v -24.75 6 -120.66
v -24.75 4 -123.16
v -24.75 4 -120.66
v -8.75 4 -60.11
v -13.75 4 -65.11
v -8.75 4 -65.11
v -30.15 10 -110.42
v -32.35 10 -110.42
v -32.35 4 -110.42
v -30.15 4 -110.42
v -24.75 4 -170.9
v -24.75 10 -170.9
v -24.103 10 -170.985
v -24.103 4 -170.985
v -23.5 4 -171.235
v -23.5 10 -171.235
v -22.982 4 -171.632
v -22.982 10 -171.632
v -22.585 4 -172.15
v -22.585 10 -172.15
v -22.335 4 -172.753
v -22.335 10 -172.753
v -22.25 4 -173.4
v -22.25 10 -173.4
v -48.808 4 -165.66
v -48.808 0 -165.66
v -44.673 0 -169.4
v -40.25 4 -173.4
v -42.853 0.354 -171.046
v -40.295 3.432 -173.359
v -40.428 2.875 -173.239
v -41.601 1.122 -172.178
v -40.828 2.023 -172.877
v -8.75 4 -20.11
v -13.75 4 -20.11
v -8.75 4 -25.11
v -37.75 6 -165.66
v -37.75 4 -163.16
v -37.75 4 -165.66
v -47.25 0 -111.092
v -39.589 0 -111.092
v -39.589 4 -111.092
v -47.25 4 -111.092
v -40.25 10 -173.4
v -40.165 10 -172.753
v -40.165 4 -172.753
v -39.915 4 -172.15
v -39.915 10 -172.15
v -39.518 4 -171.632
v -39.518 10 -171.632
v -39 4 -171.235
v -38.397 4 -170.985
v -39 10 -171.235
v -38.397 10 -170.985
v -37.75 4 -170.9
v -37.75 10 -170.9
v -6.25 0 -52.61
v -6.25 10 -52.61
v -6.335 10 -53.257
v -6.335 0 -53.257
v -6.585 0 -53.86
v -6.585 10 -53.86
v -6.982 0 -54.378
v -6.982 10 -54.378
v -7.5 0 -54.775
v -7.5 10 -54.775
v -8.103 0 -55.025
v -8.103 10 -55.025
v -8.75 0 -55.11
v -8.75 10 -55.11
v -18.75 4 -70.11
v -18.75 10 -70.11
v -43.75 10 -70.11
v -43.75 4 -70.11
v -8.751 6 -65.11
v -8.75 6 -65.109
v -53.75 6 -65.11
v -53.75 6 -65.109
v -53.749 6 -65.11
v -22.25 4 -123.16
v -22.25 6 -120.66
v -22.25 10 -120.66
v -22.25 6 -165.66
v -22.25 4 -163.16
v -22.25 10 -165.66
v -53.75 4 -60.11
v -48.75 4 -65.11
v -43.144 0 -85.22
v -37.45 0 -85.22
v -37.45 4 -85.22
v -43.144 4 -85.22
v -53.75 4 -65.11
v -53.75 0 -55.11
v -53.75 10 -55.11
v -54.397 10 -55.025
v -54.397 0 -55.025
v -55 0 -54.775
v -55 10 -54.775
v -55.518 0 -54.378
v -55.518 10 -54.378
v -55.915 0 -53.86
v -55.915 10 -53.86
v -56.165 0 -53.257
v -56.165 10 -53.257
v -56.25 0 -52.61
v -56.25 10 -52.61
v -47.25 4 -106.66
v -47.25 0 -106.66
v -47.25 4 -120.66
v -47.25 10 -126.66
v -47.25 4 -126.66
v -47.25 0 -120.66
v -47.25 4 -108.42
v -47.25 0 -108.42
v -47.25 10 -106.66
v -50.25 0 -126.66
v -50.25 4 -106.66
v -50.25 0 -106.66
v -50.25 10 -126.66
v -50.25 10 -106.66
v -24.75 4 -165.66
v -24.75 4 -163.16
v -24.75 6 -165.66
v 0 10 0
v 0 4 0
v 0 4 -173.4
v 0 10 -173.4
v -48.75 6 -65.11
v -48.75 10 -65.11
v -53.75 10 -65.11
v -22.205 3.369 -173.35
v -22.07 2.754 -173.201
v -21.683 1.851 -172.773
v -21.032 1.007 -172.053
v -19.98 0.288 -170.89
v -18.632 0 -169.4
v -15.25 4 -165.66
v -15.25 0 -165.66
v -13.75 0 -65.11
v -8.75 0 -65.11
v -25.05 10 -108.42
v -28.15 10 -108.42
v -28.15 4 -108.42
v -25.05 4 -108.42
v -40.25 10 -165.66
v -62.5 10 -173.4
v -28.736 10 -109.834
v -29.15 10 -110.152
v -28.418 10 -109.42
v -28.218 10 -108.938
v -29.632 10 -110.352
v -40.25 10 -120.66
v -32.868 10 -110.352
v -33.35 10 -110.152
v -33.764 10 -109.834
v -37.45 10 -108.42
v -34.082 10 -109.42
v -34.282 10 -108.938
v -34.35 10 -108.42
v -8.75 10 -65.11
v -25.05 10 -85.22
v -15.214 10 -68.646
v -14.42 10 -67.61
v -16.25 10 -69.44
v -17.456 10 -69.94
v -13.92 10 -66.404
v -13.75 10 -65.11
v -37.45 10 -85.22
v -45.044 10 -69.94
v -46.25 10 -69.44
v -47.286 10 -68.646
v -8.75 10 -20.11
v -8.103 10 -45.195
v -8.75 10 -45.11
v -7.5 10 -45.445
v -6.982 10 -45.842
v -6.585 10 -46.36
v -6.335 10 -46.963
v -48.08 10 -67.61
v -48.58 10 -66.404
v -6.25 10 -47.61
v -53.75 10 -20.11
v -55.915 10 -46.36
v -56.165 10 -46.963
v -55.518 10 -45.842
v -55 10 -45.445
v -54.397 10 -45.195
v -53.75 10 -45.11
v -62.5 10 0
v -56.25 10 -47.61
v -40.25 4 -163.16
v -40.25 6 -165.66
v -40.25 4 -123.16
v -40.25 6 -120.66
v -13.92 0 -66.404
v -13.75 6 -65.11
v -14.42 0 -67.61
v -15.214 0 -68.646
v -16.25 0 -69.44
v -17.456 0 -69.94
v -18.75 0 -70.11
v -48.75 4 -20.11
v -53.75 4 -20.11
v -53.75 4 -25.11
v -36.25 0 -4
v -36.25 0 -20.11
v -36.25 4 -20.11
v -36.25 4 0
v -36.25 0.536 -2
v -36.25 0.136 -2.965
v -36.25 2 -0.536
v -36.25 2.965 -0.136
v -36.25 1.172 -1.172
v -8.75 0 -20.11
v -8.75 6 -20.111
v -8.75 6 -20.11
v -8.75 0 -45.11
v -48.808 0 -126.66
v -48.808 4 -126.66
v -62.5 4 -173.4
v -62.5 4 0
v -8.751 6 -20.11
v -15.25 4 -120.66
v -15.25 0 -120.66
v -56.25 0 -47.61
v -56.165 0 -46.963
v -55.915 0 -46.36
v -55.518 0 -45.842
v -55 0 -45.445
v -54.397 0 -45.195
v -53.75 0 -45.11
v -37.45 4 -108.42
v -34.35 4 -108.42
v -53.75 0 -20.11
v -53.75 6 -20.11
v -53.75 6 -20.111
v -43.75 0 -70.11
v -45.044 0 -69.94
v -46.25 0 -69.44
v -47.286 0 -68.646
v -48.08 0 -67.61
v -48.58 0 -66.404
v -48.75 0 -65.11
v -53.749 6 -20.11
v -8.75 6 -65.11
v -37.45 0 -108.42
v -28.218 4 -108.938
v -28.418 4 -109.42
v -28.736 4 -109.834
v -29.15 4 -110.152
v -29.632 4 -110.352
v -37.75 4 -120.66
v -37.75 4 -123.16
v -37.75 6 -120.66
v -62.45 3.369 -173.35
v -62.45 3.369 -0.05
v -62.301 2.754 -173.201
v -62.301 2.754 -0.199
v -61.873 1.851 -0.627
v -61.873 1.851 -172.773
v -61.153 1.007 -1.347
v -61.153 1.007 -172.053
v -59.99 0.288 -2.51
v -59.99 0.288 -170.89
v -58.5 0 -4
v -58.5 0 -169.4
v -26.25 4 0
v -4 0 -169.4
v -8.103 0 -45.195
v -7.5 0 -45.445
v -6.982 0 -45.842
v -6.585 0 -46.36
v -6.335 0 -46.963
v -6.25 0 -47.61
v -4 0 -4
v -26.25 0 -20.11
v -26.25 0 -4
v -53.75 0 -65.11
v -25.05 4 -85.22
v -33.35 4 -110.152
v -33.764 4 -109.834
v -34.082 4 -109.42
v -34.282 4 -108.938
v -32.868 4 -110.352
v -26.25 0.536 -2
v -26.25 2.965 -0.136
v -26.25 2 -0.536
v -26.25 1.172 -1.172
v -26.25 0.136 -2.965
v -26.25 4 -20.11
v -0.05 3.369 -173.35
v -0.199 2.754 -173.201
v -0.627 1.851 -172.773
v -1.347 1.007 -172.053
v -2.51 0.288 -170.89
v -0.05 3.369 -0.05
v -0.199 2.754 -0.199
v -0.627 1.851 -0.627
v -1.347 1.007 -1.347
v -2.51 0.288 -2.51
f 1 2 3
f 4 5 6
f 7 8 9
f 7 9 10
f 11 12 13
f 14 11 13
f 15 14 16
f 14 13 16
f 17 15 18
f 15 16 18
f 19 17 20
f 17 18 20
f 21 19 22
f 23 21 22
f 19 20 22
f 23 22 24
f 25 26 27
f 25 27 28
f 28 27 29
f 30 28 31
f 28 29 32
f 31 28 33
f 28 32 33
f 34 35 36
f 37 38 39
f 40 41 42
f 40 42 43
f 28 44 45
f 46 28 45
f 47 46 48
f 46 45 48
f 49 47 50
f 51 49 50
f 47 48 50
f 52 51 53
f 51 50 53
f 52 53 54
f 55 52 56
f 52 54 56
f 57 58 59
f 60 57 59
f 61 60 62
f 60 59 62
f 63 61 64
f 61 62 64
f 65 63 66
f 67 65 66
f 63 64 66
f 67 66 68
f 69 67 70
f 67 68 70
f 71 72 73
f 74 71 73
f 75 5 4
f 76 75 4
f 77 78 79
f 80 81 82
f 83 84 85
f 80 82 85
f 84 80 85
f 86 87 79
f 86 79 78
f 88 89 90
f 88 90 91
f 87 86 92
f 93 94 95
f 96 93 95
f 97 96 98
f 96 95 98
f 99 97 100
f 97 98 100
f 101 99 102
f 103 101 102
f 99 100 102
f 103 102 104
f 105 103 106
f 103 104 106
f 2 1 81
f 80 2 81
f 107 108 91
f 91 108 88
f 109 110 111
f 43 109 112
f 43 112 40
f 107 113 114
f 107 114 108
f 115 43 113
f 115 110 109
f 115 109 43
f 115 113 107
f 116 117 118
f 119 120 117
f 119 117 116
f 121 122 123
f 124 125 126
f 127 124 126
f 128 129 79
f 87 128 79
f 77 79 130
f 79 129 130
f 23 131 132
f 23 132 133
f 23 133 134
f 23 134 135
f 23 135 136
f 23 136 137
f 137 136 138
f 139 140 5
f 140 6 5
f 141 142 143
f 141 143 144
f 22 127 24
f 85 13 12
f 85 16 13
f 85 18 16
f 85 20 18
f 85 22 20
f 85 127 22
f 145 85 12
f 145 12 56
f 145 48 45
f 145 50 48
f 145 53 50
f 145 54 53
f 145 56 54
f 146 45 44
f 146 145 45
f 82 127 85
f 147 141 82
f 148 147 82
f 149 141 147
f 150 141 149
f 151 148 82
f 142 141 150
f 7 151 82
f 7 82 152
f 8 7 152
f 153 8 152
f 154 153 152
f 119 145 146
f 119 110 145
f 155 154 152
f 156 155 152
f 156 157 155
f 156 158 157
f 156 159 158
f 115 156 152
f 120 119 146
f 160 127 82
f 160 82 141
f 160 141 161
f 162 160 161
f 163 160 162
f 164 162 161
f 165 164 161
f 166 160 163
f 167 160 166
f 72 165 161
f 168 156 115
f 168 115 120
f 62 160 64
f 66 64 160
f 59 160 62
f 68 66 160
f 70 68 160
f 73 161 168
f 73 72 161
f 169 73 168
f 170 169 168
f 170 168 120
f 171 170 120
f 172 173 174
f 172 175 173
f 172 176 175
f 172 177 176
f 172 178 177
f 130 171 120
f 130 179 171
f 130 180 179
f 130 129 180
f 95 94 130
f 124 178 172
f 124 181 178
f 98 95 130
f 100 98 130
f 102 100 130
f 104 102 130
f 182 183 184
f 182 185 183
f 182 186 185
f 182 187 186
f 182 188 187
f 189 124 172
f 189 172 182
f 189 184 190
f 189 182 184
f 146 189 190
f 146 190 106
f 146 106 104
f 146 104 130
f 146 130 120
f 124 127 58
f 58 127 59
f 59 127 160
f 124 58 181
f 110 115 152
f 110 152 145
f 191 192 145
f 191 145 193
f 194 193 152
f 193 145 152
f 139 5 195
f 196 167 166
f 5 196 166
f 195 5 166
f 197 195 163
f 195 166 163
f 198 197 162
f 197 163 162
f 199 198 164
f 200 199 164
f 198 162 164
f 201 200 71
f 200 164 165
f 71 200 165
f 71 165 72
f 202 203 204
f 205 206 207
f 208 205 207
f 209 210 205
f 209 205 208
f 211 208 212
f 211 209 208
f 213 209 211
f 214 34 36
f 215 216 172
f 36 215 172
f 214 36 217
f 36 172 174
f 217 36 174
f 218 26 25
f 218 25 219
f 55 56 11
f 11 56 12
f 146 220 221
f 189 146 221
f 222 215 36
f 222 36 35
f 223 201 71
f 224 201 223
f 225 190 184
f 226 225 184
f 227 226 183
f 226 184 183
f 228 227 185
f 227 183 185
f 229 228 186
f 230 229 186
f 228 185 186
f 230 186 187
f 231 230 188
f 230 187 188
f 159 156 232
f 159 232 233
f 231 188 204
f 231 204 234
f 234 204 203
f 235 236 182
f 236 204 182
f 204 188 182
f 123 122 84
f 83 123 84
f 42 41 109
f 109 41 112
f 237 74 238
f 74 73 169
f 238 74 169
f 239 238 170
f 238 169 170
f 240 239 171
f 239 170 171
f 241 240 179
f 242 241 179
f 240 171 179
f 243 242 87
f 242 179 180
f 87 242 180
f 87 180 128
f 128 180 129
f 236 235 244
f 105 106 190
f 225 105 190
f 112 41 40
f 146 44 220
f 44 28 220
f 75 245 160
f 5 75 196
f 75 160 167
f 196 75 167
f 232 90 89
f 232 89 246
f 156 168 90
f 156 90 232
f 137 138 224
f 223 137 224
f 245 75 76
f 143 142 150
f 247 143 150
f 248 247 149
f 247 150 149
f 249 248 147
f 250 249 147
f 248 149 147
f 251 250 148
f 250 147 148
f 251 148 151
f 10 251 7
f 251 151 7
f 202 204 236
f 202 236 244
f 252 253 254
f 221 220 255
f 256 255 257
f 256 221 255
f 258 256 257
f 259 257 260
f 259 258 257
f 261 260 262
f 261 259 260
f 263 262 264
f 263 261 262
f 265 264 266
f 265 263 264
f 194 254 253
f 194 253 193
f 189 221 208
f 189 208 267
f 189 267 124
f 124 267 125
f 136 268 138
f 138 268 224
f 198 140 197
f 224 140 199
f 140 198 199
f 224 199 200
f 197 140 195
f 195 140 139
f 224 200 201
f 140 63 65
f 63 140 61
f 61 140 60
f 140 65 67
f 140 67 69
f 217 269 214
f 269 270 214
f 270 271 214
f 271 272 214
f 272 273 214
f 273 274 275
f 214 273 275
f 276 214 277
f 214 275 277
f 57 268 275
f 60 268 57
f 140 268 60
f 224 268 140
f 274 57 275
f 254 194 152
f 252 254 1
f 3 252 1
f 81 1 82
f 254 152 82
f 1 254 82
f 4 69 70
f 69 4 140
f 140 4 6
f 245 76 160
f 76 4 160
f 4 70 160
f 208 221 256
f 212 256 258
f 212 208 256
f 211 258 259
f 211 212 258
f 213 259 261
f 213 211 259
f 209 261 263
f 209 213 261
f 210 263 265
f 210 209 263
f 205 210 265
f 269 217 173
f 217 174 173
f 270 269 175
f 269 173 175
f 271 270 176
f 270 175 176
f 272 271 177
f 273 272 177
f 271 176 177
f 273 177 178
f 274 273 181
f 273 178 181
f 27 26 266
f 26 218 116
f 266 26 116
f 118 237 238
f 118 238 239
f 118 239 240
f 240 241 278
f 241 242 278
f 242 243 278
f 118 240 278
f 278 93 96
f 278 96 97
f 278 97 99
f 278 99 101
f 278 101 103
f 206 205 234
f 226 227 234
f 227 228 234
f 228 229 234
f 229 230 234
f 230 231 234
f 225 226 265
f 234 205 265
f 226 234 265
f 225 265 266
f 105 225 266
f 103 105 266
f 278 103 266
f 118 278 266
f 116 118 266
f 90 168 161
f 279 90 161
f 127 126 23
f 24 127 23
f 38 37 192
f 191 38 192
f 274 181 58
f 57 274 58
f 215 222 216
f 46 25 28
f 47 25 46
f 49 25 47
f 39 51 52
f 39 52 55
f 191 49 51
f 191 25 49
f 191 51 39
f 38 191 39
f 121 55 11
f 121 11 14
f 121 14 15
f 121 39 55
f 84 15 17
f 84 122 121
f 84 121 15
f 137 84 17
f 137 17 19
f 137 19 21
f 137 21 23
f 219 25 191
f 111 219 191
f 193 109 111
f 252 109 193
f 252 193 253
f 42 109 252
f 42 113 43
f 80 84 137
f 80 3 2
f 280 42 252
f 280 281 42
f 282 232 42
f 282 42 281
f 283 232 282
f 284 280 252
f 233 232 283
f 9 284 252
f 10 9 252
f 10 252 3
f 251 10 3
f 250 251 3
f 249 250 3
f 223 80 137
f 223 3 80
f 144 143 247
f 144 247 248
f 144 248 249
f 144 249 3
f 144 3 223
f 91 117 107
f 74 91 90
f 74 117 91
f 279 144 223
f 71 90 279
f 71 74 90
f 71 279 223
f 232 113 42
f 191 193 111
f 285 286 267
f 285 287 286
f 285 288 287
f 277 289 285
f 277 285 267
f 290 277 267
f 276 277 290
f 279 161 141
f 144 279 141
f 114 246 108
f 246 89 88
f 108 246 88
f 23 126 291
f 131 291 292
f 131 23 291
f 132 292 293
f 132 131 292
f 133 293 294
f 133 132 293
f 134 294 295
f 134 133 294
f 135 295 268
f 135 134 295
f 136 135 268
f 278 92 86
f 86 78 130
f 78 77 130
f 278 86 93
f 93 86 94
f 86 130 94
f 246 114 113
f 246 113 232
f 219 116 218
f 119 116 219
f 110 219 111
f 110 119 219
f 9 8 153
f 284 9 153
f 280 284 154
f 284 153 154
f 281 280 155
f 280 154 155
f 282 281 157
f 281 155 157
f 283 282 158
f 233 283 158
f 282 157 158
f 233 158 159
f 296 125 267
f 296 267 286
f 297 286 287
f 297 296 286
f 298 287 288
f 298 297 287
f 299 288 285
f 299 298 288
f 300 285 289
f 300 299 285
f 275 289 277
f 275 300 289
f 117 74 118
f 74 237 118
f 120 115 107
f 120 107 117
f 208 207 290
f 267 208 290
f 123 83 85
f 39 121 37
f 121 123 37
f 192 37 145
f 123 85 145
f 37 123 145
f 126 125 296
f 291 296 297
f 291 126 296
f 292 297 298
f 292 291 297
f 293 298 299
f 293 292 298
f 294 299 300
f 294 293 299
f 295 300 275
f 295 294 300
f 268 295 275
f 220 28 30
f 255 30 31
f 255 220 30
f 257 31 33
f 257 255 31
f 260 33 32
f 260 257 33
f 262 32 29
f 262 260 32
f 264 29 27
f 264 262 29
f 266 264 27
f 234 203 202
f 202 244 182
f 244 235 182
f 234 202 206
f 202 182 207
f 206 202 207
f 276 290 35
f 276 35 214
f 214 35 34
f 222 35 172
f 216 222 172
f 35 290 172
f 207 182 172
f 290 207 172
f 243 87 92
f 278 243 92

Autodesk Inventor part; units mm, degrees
ref_plane "YZ Plane" through (0, 0, 0) normal (1, 0, 0) x (0, 1, 0)
ref_plane "XZ Plane" through (0, 0, 0) normal (0, 1, 0) x (-1, 0, 0)
sketch "Sketch1" plane through (0, 0, 0) normal (0, 1, 0) x (-1, 0, 0)
  line L0 (0, 0) -> (0, -173.4)
  line L1 (0, -173.4) -> (62.5, -173.4)
  line L2 (62.5, -173.4) -> (62.5, 0)
  line L3 (62.5, 0) -> (0, 0)
  dimension "d0" = 173.4
  dimension "d1" = 62.5
extrude "Extrusion1" add sketch "Sketch1" along normal blind 10
sketch "Sketch2" plane through (0, 10, 0) normal (0, 1, 0) x (1, 0, 0)
  line L0 (0, 0) -> (0, 102.12)
  line L1 (0, 0) -> (0, 173.4) projected
  line L2 (0, 102.12) -> (-62.5, 102.12)
  line L3 (-62.5, 173.4) -> (-62.5, 0) projected
  line L4 (-31.25, 102.12) -> (-31.25, 0)
  line L5 (-62.5, 0) -> (0, 0) projected
  line L6 (-31.25, 102.12) -> (-37.45, 102.12)
  line L7 (-37.45, 102.12) -> (-31.25, 102.12)
  line L8 (-31.25, 102.12) -> (-25.05, 102.12)
  line L9 (-25.05, 102.12) -> (-31.25, 102.12)
  line L10 (-31.25, 102.12) -> (-31.25, 85.22)
  line L11 (-31.25, 85.22) -> (-25.05, 85.22)
  line L12 (-25.05, 85.22) -> (-25.05, 102.12)
  line L13 (-31.25, 85.22) -> (-37.45, 85.22)
  line L14 (-37.45, 85.22) -> (-37.45, 102.12)
  line L15 (-31.25, 102.12) -> (-31.25, 108.42)
  line L16 (-31.25, 108.42) -> (-25.05, 108.42)
  line L17 (-25.05, 108.42) -> (-25.05, 102.12)
  line L18 (-37.45, 102.12) -> (-37.45, 108.42)
  line L19 (-37.45, 108.42) -> (-31.25, 108.42)
  line L20 (-31.25, 108.42) -> (-31.25, 173.4)
  line L21 (0, 173.4) -> (-62.5, 173.4) projected
  line L22 (-31.25, 140.91) -> (-31.25, 120.66)
  line L23 (-31.25, 120.66) -> (-22.25, 120.66)
  line L24 (-22.25, 120.66) -> (-22.25, 165.66)
  line L25 (-22.25, 165.66) -> (-40.25, 165.66)
  line L26 (-40.25, 165.66) -> (-40.25, 120.66)
  line L27 (-40.25, 120.66) -> (-31.25, 120.66)
  line L28 (-40.25, 120.66) -> (-40.25, 126.66)
  line L29 (-40.25, 126.66) -> (-44.25, 126.66)
  line L30 (-44.25, 126.66) -> (-47.25, 126.66)
  line L31 (-47.25, 126.66) -> (-47.25, 106.66)
  line L32 (-47.25, 106.66) -> (-50.25, 106.66)
  line L33 (-50.25, 106.66) -> (-50.25, 126.66)
  line L34 (-50.25, 126.66) -> (-47.25, 126.66)
  line L35 (-31.25, 0) -> (-31.25, 85.22)
  line L36 (-31.25, 42.61) -> (-31.25, 20.11)
  line L37 (-31.25, 20.11) -> (-31.25, 42.61)
  line L38 (-31.25, 42.61) -> (-31.25, 65.11)
  line L39 (-31.25, 65.11) -> (-53.75, 65.11)
  line L40 (-53.75, 65.11) -> (-53.75, 20.11)
  line L41 (-53.75, 20.11) -> (-8.75, 20.11)
  line L42 (-8.75, 20.11) -> (-8.75, 65.11)
  line L43 (-8.75, 65.11) -> (-31.25, 65.11)
  line L44 (-22.25, 120.66) -> (-40.25, 120.66)
  line L45 (-40.25, 120.66) -> (-40.25, 165.66)
  line L46 (-40.25, 165.66) -> (-22.25, 165.66)
  line L47 (-22.25, 165.66) -> (-22.25, 120.66)
  line L48 (-53.75, 65.11) -> (-48.75, 65.11)
  line L49 (-48.75, 65.11) -> (-8.75, 65.11)
  line L50 (-8.75, 65.11) -> (-13.75, 65.11)
  line L51 (-13.75, 65.11) -> (-13.75, 70.11)
  line L52 (-13.75, 70.11) -> (-48.75, 70.11)
  line L53 (-48.75, 70.11) -> (-48.75, 65.11)
  line L54 (-48.75, 65.11) -> (-13.75, 65.11) construction
  line L55 (-18.75, 70.11) -> (-43.75, 70.11)
  arc A0 (-43.75, 70.11) -> (-48.75, 65.11) centre (-43.75, 65.11) ccw
  arc A1 (-13.75, 65.11) -> (-18.75, 70.11) centre (-18.75, 65.11) ccw
  line L56 (-8.75, 65.11) -> (-8.75, 55.11)
  line L57 (-8.75, 55.11) -> (-8.75, 45.11)
  line L58 (-8.75, 45.11) -> (-53.75, 45.11)
  line L59 (-53.75, 45.11) -> (-53.75, 55.11)
  line L60 (-53.75, 45.11) -> (-53.75, 55.11) construction
  line L61 (-51.25, 47.61) -> (-51.25, 52.61)
  line L62 (-56.25, 52.61) -> (-56.25, 47.61)
  arc A2 (-56.25, 47.61) -> (-51.25, 47.61) centre (-53.75, 47.61) ccw
  arc A3 (-51.25, 52.61) -> (-56.25, 52.61) centre (-53.75, 52.61) ccw
  line L63 (-8.75, 45.11) -> (-8.75, 55.11) construction
  line L64 (-6.25, 47.61) -> (-6.25, 52.61)
  line L65 (-11.25, 52.61) -> (-11.25, 47.61)
  arc A4 (-11.25, 47.61) -> (-6.25, 47.61) centre (-8.75, 47.61) ccw
  arc A5 (-6.25, 52.61) -> (-11.25, 52.61) centre (-8.75, 52.61) ccw
  line L66 (-40.25, 165.66) -> (-40.25, 173.4)
  line L67 (-22.25, 165.66) -> (-22.25, 173.4)
  line L68 (-40.25, 173.4) -> (-22.25, 173.4) construction
  line L69 (-37.75, 170.9) -> (-24.75, 170.9)
  line L70 (-24.75, 175.9) -> (-37.75, 175.9)
  arc A6 (-37.75, 175.9) -> (-37.75, 170.9) centre (-37.75, 173.4) ccw
  arc A7 (-24.75, 170.9) -> (-24.75, 175.9) centre (-24.75, 173.4) ccw
  line L71 (-31.25, 102.12) -> (-34.35, 102.12)
  line L72 (-28.15, 102.12) -> (-31.25, 102.12)
  line L73 (-34.35, 102.12) -> (-28.15, 102.12) construction
  line L74 (-32.35, 100.12) -> (-30.15, 100.12)
  line L75 (-30.15, 104.12) -> (-32.35, 104.12)
  arc A8 (-32.35, 104.12) -> (-32.35, 100.12) centre (-32.35, 102.12) ccw
  arc A9 (-30.15, 100.12) -> (-30.15, 104.12) centre (-30.15, 102.12) ccw
  arc A10 (-32.35, 110.42) -> (-32.35, 106.42) centre (-32.35, 108.42) ccw
  arc A11 (-30.15, 106.42) -> (-30.15, 110.42) centre (-30.15, 108.42) ccw
  line L76 (-32.35, 110.42) -> (-30.15, 110.42)
  point P0 (-31.25, 165.66)
  point P1 (-31.25, 165.66)
  point P2 (-53.75, 50.11)
  point P3 (-8.75, 50.11)
  point P4 (-34.35, 108.42)
  point P5 (-28.15, 108.42)
  dimension "d4" = 102.12
  dimension "d5" = 6.2
  dimension "d6" = 6.2
  dimension "d7" = 16.9
  dimension "d8" = 6.3
  dimension "d11" = 20.25
  dimension "d12" = 9
  dimension "d13" = 45
  dimension "d14" = 18
  dimension "d15" = 6
  dimension "d16" = 4
  dimension "d17" = 3
  dimension "d18" = 20
  dimension "d19" = 3
  dimension "d20" = 22.5
  dimension "d21" = 22.5
  dimension "d22" = 22.5
  dimension "d23" = 45
  dimension "d24" = 5
  dimension "d25" = 5
  dimension "d26" = 5
  dimension "d27" = 10
  dimension "d28" = 10
  dimension "d29" = 5
  dimension "d30" = 5
  dimension "d36" = 5
  dimension "d37" = 4
  dimension "d39" = 4
extrude "Extrusion2" cut sketch "Sketch2" against normal through all contours L12 L11 L4 L74 A9 L2 | L2 A9 L75 L15 L16 L17 | L41 L40 L58 L4 | L4 L58 L42 L41 | A7 L69 L20 L21 | A9 L74 L4 L2 | L2 L15 L75 A9 | L31 L32 L33 L34 | L20 L69 A6 L21 | L24 L23 L20 L25 | L4 L74 A8 L2 | L2 A8 L75 L15 | L13 L14 L2 A8 L74 L4 | L16 L20 L76 A11 | L58 A2 L61 A3 L40 L39 L4 | L4 L43 L42 A5 L65 A4 L58 | A2 L62 A3 L40 | L40 A3 L61 A2 | A4 L65 A5 L42 | L42 A5 L64 A4 | L18 L19 L15 L75 A8 L2 | L20 L27 L26 L25 | L52 A1 L43 L4 | L4 L39 A0 L52 | L19 A10 L76 L20
sketch "Sketch3" plane through (0, 10, 0) normal (0, 1, 0) x (1, 0, 0)
  point P0 (0, 0)
sketch "Sketch4" plane through (0, 0, 0) normal (0, -1, 0) x (1, 0, 0)
  line L0 (-8.75, -20.11) -> (-53.75, -20.11) projected
  line L1 (-53.75, -20.11) -> (-8.75, -20.11)
  line L2 (-8.75, -20.11) -> (-31.25, -20.11)
  line L3 (-62.5, 0) -> (0, 0) projected
  line L4 (-31.25, 0) -> (-31.25, -20.11)
  line L5 (-31.25, -20.11) -> (-26.25, -20.11)
  line L6 (-26.25, -20.11) -> (-36.25, -20.11)
  line L7 (-36.25, -20.11) -> (-36.25, 0)
  line L8 (-36.25, 0) -> (-26.25, 0)
  line L9 (-26.25, 0) -> (-26.25, -20.11)
  line L10 (-40.25, -165.66) -> (-40.25, -120.66) projected
  line L11 (-40.25, -120.66) -> (-47.25, -120.66)
  line L12 (-47.25, -126.66) -> (-47.25, -106.66) projected
  line L13 (-48.8082, -126.9328) -> (-40.25, -126.9328)
  line L14 (-40.25, -126.9328) -> (-48.8082, -126.9328)
  line L15 (-40.25, -165.66) -> (-22.25, -165.66) projected
  line L16 (-40.25, -165.66) -> (-48.8082, -165.66)
  line L17 (-48.8082, -165.66) -> (-48.8082, -126.9328)
  line L18 (-22.25, -120.66) -> (-22.25, -165.66) projected
  line L19 (-22.25, -165.66) -> (-15.25, -165.66)
  line L20 (-15.25, -165.66) -> (-15.25, -120.66)
  line L21 (-15.25, -120.66) -> (-22.25, -120.66)
  line L22 (-40.25, -120.66) -> (-22.25, -120.66) projected
  line L23 (-22.25, -120.66) -> (-40.25, -120.66)
  line L24 (-40.25, -120.66) -> (-40.25, -126.9328)
  line L25 (-40.25, -165.66) -> (-40.25, -126.9328)
  line L26 (-22.25, -120.66) -> (-22.25, -165.66)
  line L27 (-40.25, -165.66) -> (-40.25, -173.4)
  line L28 (0, -173.4) -> (-62.5, -173.4) projected
  line L29 (-48.8082, -165.66) -> (-40.25, -173.4)
  line L30 (-22.25, -165.66) -> (-22.25, -173.4)
  line L31 (-22.25, -173.4) -> (-15.25, -165.66)
  line L32 (-40.25, -173.4) -> (-22.25, -173.4)
  line L33 (-37.45, -108.42) -> (-37.45, -85.22) projected
  line L34 (-25.05, -85.22) -> (-25.05, -108.42) projected
  line L35 (-37.45, -108.42) -> (-25.05, -108.42)
  line L36 (-25.05, -108.42) -> (-22.25, -120.66)
  line L37 (-37.45, -108.42) -> (-40.25, -120.66)
  line L38 (-43.75, -70.11) -> (-18.75, -70.11) projected
  line L39 (-50.25, -126.66) -> (-50.25, -106.66) projected
  line L40 (-43.75, -70.11) -> (-50.25, -106.66)
  line L41 (-47.25, -106.66) -> (-50.25, -106.66) projected
  line L42 (-47.25, -106.66) -> (-40.25, -70.11)
  line L43 (-18.75, -70.11) -> (-15.25, -120.66)
  line L44 (-25.05, -108.42) -> (-37.45, -108.42) projected
  line L45 (-25.05, -85.22) -> (-37.45, -85.22) projected
  line L46 (-25.05, -108.42) -> (-25.05, -85.22)
  line L47 (-25.05, -85.22) -> (-43.1438, -85.22)
  line L48 (-37.45, -108.42) -> (-47.25, -120.66)
  line L49 (-48.8082, -126.9328) -> (-48.8082, -120.66)
  line L50 (-48.8082, -120.66) -> (-47.25, -120.66)
  line L51 (-37.45, -108.42) -> (-47.25, -108.42)
  line L52 (-37.45, -108.42) -> (-38.0612, -111.0919)
  line L53 (-38.0612, -111.0919) -> (-47.25, -111.0919)
  point P0 (-39.5893, -111.0919)
  dimension "d31" = 5
  dimension "d32" = 10
  dimension "d33" = 7
extrude "Extrusion3" cut sketch "Sketch4" against normal blind 4 contours L0 L4 L3 L9 | L0 L7 L3 L4 | L16 L17 L13 L10 | L27 L29 L16 | L15 L30 L28 L27 | L13 L49 L50 L11 L10 | L18 L21 L20 L19 | L19 L31 L30 | L37 L35 L36 L22 | L11 L48 L53 L37 | L36 L34 L45 L47 L42 L38 L43 L21 | L53 L48 L37 | L12 L51 L48 L53 | L42 L41 L40 L38
sketch "Sketch5" plane through (-40.25, 10, -165.66) normal (0, 0, 1) x (1, 0, 0)
  point P0 (40.25, -10)
fillet "Fillet1" radius 4 6 edges at (0, 0, -86.7) (-62.5, 0, -86.7) (-49.375, 0, 0) (-13.125, 0, 0) (-51.375, 0, -173.4) (-11.125, 0, -173.4)
ref_plane "Work Plane1" through (-38.25, 4, -70.11) normal (0, -1, 0) x (1, 0, 0)
sketch "Sketch6" plane through (-38.25, 4, -70.11) normal (0, -1, 0) x (1, 0, 0)
  line L0 (-15.5, 15) -> (-15.5, 5) projected
  arc A0 (-10.5, 5) -> (-5.5, 0) centre (-5.5, 5) ccw projected
  line L1 (-15.5, 5) -> (-10.5, 5)
  line L2 (-15.5, 5) -> (-10.5, 5) projected
  line L3 (-10.5, 5) -> (-15.5, 5)
  line L4 (-15.5, 5) -> (-15.5, 10)
  line L5 (-15.5, 10) -> (-10.5, 5)
  line L6 (-15.5, 50) -> (-15.5, 25) projected
  line L7 (-15.5, 50) -> (-15.5, 45)
  line L8 (-15.5, 45) -> (-15.5, 50)
  line L9 (-15.5, 50) -> (2, 50) projected
  line L10 (-15.5, 50) -> (-10.5, 50)
  line L11 (-10.5, 50) -> (-15.5, 45)
  line L12 (-5.5, 0) -> (19.5, 0) projected
  line L13 (7, 0) -> (7, 50)
  line L14 (12, 50) -> (2, 50) projected
  line L15 (29.5, 15) -> (29.5, 5)
  line L16 (29.5, 5) -> (24.5, 5)
  line L17 (29.5, 10) -> (24.5, 5)
  line L18 (29.5, 50) -> (29.5, 45)
  line L19 (29.5, 50) -> (12, 50)
  line L20 (24.5, 50) -> (29.5, 45)
  line L21 (-2, -50.55) -> (-2, -95.55) projected
  line L22 (-2, -50.55) -> (-2, -53.05)
  line L23 (-2, -53.05) -> (-2, -50.55)
  line L24 (-2, -50.55) -> (-2, -53.05)
  line L25 (-2, -53.05) -> (0.5, -53.05)
  line L26 (0.5, -53.05) -> (0.5, -50.55)
  line L27 (16, -50.55) -> (-2, -50.55) projected
  line L28 (-2, -50.55) -> (0.5, -50.55)
  line L29 (-2, -50.55) -> (-2, -53.05)
  line L30 (7, -50.55) -> (7, -95.55)
  line L31 (-2, -95.55) -> (16, -95.55) projected
  line L32 (-2, -95.55) -> (-2, -93.05)
  line L33 (-2, -93.05) -> (0.5, -93.05)
  line L34 (0.5, -93.05) -> (0.5, -95.55)
  line L35 (0.5, -95.55) -> (-2, -95.55)
  line L36 (16, -50.55) -> (16, -95.55)
  line L37 (16, -50.55) -> (16, -53.05)
  line L38 (16, -53.05) -> (13.5, -53.05)
  line L39 (13.5, -53.05) -> (13.5, -50.55)
  line L40 (-2, -50.55) -> (16, -50.55)
  line L41 (16, -95.55) -> (-2, -95.55)
  line L42 (16, -93.05) -> (13.5, -93.05)
  line L43 (13.5, -93.05) -> (13.5, -95.55)
  point P0 (38.25, 70.11)
  dimension "d40" = 5
  dimension "d41" = 5
  dimension "d42" = 5
  dimension "d43" = 2.5
  dimension "d44" = 2.5
  dimension "d45" = 2.5
  dimension "d46" = 2.5
extrude "Extrusion4" add sketch "Sketch6" against normal blind 2 contours L5 L1 L0 | L11 L6 L9 | L19 L18 L20 | L15 L16 L17 | L27 L26 L25 L21 | L33 L34 L31 L21 | L27 L36 L38 L39 | L43 L42 L36 L31
chamfer "Chamfer1" distance 3.535 distance2 2 1 edges at (-51.25, 6, -22.61) measured on face at (-52.0833, 6, -21.7767)
chamfer "Chamfer2" distance 3.535 distance2 2 1 edges at (-51.25, 6, -62.61) measured on face at (-52.0833, 6, -63.4433)
chamfer "Chamfer3" distance 3.535 distance2 2 1 edges at (-11.25, 6, -62.61) measured on face at (-10.4167, 6, -63.4433)
chamfer "Chamfer4" distance 3.535 distance2 2 1 edges at (-11.25, 6, -22.61) measured on face at (-10.4167, 6, -21.7767)
chamfer "Chamfer5" distance 2.5 distance2 2 1 edges at (-23.5, 6, -123.16) measured on face at (-23.0833, 6, -122.3267)
chamfer "Chamfer6" distance 2.5 distance2 2 1 edges at (-39, 6, -123.16) measured on face at (-39.4167, 6, -121.4933)
chamfer "Chamfer7" distance 2.5 distance2 2 1 edges at (-39, 6, -163.16) measured on face at (-39.4167, 6, -163.9933)
chamfer "Chamfer8" distance 2.5 distance2 2 1 edges at (-23.5, 6, -163.16) measured on face at (-23.9167, 6, -163.9933)
properties part number "inside"
